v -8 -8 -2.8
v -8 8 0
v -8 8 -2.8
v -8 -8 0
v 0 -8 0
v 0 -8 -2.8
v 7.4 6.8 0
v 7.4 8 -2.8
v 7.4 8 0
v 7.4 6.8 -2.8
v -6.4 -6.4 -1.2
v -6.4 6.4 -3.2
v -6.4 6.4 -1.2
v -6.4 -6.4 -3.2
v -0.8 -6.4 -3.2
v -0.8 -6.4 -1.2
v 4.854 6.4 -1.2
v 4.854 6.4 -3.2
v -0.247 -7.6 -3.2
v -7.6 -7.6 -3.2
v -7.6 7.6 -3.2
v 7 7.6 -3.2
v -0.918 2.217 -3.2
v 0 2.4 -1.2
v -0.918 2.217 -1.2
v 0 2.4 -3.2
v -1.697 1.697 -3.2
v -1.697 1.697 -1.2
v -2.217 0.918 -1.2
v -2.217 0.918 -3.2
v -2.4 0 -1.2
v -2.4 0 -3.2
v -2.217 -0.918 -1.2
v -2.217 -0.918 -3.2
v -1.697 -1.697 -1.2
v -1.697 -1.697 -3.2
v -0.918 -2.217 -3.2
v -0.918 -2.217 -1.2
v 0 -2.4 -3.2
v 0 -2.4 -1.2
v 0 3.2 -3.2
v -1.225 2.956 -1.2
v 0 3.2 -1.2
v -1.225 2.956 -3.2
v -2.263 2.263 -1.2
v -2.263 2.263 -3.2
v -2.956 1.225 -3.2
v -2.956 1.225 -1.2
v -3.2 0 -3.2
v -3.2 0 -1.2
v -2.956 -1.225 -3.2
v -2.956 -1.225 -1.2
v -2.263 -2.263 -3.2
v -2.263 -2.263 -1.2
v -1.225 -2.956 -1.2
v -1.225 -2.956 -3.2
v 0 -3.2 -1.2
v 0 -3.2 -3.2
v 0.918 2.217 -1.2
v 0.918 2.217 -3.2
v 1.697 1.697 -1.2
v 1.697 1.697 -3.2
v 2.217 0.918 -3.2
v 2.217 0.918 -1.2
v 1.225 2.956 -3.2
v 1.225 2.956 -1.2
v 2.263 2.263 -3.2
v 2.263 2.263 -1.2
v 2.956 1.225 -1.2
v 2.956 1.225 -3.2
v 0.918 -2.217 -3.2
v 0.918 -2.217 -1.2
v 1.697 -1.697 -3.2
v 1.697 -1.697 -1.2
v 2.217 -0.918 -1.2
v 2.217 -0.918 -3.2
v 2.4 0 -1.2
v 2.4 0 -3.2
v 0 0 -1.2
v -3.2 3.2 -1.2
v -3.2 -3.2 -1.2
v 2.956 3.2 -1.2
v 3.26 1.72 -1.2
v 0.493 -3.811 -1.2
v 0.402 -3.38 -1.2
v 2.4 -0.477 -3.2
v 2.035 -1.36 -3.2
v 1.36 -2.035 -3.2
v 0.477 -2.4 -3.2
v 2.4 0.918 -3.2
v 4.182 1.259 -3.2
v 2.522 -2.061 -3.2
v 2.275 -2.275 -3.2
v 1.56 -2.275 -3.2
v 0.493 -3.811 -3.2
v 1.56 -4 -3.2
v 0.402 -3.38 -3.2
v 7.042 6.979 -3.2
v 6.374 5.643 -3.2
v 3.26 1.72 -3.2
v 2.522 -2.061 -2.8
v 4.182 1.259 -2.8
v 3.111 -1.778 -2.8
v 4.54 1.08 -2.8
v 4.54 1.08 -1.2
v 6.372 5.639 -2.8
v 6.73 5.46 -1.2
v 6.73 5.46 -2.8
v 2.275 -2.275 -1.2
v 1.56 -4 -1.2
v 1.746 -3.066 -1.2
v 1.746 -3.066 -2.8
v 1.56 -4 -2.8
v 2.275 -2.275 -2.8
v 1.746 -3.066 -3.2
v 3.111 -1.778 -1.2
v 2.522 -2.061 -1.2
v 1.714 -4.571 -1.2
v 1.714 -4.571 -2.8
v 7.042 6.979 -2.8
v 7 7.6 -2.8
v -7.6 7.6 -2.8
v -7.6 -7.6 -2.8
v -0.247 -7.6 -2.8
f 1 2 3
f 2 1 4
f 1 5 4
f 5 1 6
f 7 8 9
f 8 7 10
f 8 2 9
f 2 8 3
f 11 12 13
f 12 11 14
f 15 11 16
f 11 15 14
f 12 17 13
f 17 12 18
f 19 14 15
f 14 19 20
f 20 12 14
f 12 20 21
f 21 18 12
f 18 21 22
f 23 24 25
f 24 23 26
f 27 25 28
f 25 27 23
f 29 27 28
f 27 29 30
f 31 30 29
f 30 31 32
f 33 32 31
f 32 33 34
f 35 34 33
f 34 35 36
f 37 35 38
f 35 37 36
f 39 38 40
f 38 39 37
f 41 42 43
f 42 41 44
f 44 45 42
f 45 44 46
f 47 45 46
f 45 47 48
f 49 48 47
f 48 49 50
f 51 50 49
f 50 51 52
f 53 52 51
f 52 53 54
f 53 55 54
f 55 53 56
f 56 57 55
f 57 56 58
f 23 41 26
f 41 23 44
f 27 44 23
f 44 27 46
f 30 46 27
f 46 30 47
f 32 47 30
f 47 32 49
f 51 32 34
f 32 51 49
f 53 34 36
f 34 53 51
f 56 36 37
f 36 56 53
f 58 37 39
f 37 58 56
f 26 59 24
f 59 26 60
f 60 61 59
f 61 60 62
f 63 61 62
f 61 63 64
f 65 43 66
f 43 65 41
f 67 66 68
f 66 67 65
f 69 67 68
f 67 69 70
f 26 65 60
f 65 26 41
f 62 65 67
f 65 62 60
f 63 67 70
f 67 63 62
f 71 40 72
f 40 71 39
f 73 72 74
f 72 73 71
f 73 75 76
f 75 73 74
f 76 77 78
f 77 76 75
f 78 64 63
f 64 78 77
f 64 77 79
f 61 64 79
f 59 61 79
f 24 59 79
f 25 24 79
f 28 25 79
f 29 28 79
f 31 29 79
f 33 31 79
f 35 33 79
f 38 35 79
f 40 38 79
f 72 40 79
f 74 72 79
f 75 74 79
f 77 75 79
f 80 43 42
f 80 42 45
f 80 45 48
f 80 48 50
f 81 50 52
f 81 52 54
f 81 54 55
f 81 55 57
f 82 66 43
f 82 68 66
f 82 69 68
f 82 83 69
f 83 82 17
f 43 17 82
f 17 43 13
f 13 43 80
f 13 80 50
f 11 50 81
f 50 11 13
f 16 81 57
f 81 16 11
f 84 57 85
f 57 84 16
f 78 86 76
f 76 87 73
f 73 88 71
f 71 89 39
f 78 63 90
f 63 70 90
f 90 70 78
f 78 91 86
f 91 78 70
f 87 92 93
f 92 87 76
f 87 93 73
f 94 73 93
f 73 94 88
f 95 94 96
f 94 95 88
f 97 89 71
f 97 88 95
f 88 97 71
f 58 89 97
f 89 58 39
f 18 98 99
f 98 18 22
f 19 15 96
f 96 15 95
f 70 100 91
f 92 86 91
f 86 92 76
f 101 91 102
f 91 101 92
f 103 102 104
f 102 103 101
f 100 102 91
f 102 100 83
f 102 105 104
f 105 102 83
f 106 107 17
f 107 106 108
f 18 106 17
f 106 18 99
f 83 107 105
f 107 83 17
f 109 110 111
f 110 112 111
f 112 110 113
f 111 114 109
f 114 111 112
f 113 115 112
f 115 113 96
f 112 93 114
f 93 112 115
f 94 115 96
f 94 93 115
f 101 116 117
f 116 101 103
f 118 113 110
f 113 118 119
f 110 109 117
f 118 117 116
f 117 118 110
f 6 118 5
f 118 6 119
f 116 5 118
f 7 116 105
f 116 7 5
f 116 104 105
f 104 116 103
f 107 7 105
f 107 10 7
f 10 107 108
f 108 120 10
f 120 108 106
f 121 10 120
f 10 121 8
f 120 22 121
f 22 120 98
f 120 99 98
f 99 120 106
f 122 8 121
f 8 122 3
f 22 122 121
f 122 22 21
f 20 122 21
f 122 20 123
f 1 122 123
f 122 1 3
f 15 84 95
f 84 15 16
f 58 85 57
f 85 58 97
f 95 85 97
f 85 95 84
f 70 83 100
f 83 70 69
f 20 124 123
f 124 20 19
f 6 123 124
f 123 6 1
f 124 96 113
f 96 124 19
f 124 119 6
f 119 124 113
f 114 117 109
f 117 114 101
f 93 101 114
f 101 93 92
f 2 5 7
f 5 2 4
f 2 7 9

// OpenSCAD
use <../lib.scad>
use <s/7828s01.scad>
function ldraw_lib__7828() = [
// 0 Tile  2 x  2 Cut Left
// 0 Name: 7828.dat
// 0 Author: Magnus Forsberg [MagFors]
// 0 !LDRAW_ORG Part UPDATE 2026-03
// 0 !LICENSE Licensed under CC BY 4.0 : see CAreadme.txt
// 
// 0 BFC CERTIFY CCW
  [0,"BFC","CERTIFY"],
  [0,"BFC","CCW"],
// 
// 0 !KEYWORDS Brickowl 570709
// 
// 0 !HISTORY 2026-03-31 [OrionP] Official Update 2026-03
// 
// 1 16 0 0 0 1 0 0 0 1 0 0 0 1 s\7828s01.dat
  [1,16,0,0,0,1,0,0,0,1,0,0,0,1, ldraw_lib__s__7828s01()],
// 0 // top surface
// 4 16 18.5 0 17 -20 0 20 -20 0 -20 0 0 -20
  [4,16,18.5,0,17,-20,0,20,-20,0,-20,0,0,-20],
// 3 16 -20 0 20 18.5 0 17 18.5 0 20
  [3,16,-20,0,20,18.5,0,17,18.5,0,20],
];
module ldraw_lib__7828(step=0, col=false, unit=2/5, alt=false, line=0.2, solid=!$preview)
    makepoly(ldraw_lib__7828(), step=step, col=col, unit=unit, alt=alt, line=line, solid=solid);
ldraw_lib__7828(line=0.2);
